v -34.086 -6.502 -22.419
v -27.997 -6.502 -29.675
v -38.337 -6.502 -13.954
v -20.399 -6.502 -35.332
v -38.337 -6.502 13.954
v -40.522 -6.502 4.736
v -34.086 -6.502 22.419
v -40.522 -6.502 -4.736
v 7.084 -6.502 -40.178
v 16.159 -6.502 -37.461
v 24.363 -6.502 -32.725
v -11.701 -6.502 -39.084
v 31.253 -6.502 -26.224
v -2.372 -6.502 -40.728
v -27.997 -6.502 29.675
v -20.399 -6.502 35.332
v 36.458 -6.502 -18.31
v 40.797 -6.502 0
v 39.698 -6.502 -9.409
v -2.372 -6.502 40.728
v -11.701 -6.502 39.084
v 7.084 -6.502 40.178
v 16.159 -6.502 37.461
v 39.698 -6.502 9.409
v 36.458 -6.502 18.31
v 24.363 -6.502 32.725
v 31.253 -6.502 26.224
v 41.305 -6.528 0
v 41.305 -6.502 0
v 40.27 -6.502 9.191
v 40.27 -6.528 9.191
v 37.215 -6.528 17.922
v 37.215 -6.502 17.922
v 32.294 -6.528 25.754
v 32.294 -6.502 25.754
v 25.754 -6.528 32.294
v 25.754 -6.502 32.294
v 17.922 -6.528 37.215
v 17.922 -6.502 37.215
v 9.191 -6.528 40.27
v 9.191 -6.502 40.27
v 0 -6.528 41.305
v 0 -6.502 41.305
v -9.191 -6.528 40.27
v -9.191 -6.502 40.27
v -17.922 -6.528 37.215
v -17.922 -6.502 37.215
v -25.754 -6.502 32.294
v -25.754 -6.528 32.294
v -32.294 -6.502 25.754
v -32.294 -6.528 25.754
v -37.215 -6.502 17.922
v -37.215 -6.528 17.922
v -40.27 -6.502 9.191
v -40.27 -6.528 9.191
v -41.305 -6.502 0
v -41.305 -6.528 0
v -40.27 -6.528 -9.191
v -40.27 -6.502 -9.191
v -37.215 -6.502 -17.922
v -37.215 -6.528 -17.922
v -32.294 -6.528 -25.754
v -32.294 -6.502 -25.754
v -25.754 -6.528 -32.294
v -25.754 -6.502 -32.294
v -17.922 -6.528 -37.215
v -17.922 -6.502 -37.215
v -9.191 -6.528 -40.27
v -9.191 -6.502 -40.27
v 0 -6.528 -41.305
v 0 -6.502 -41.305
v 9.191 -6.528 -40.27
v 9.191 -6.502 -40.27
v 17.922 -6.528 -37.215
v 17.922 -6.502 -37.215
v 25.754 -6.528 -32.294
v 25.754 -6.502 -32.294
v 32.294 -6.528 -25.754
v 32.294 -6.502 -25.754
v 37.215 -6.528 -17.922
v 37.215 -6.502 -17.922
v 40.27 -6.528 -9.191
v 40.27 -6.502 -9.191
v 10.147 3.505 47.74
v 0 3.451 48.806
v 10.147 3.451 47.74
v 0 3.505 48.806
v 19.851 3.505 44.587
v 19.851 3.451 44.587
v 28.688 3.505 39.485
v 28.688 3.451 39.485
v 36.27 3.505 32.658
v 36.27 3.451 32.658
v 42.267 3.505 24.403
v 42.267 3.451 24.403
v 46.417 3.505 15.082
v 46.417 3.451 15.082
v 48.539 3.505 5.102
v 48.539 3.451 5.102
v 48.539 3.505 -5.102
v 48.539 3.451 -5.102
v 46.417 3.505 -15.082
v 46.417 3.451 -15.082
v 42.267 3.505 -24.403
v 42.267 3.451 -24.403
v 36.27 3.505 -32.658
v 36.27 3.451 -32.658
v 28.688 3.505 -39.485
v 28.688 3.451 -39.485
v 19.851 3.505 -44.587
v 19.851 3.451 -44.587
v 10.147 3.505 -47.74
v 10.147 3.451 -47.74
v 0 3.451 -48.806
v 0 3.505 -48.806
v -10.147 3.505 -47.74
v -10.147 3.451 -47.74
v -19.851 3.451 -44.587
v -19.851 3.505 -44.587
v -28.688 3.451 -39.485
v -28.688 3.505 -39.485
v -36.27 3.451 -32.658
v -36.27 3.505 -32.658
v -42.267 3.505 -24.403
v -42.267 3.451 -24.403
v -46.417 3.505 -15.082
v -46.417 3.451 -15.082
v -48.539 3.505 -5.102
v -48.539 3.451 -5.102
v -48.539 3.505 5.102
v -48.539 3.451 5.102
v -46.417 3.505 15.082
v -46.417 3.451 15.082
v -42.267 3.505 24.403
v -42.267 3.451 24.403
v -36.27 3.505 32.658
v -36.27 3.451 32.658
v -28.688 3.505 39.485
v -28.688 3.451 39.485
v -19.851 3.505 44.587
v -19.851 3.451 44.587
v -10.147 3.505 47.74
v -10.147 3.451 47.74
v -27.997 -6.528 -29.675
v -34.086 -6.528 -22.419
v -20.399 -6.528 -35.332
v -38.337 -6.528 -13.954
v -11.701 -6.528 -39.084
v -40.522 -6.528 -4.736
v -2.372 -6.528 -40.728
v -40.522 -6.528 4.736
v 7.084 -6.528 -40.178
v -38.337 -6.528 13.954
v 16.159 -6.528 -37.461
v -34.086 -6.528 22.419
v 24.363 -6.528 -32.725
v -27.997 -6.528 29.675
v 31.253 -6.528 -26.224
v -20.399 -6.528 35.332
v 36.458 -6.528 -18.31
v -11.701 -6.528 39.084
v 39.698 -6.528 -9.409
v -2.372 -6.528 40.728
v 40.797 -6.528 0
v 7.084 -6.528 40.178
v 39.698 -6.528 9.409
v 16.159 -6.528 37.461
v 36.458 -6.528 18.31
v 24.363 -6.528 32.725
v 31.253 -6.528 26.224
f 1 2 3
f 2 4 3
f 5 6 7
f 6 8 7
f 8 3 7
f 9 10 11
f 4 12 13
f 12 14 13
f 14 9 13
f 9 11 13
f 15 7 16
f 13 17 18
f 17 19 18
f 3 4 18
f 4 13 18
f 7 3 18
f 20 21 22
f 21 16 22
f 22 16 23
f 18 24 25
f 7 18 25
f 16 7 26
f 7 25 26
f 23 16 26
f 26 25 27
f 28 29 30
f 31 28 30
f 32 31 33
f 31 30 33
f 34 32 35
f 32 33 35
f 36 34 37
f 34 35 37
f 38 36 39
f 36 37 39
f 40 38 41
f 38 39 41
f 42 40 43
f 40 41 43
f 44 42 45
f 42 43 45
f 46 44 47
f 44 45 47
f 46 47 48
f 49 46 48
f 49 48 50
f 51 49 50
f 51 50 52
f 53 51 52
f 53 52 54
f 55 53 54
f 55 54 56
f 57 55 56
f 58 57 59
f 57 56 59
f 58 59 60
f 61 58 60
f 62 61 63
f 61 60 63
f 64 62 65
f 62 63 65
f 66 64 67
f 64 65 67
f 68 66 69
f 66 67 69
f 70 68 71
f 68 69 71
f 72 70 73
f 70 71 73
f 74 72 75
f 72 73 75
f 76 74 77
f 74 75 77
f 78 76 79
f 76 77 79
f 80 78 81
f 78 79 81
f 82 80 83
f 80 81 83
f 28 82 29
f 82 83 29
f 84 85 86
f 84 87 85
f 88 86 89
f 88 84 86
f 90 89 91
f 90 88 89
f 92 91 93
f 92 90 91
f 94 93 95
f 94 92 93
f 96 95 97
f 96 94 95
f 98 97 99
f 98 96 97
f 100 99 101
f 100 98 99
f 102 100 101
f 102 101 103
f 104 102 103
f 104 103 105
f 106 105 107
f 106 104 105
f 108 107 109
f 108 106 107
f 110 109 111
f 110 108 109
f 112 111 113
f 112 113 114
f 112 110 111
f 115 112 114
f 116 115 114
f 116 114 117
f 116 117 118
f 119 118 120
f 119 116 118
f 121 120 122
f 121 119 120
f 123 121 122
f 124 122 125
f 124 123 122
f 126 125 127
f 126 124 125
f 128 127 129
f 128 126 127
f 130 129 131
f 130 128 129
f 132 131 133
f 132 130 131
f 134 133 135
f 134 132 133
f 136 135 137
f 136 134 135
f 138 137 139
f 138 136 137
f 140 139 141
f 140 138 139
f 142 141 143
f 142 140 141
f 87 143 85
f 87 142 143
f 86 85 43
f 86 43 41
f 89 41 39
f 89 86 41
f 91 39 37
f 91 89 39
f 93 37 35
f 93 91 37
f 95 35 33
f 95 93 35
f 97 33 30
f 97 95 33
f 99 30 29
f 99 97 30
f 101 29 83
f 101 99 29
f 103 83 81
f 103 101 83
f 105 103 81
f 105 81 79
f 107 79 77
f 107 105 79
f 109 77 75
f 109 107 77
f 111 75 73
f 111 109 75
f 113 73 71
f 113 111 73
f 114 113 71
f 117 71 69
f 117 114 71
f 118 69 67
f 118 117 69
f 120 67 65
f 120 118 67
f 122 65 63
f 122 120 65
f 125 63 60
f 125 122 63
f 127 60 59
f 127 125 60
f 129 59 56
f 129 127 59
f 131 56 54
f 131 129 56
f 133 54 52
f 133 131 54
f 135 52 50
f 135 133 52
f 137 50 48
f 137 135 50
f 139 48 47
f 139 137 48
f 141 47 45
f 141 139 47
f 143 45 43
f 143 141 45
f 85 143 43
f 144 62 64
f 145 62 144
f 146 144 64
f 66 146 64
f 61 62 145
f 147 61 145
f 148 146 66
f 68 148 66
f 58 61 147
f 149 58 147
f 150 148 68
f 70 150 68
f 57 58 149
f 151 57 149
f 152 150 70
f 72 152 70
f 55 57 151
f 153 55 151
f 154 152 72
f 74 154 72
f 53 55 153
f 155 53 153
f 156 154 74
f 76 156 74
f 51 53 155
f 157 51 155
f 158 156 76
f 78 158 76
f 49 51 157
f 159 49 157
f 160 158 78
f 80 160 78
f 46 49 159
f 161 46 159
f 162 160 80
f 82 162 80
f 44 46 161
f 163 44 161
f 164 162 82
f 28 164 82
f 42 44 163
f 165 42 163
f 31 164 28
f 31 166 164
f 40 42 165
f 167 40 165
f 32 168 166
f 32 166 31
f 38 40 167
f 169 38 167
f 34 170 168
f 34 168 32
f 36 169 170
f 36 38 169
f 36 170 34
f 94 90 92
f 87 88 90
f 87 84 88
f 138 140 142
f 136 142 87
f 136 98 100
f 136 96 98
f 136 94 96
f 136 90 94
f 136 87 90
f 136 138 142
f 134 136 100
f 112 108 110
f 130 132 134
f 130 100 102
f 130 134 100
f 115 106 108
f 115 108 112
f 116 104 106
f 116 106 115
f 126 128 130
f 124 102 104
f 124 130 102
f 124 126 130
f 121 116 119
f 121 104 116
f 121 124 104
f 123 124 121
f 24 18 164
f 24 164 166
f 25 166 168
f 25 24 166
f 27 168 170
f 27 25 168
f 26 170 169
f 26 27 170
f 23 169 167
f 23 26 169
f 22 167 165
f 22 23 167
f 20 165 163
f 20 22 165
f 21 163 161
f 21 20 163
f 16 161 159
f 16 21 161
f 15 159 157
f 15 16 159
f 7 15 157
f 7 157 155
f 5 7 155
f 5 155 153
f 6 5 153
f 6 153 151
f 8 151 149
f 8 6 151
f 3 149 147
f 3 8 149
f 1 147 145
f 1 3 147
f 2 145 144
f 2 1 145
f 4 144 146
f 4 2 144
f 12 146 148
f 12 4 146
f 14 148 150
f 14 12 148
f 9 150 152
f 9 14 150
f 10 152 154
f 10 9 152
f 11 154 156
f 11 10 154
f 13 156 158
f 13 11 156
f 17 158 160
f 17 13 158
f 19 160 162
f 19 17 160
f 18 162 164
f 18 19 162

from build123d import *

# Parameters (mm, degrees)
SKETCH1_R               = 48.8061
EXTRUDE1_DEPTH          = 6.5024
CHAMFER2_SIZE           = 7.50062
CHAMFER2_SIZE2          = 9.95365893
SKETCH6_R               = 41.30548
SKETCH6_R_2             = 40.79748
EXTRUDE_THIN2_DEPTH     = 0.0254
CUT_EXTRUDE1_DEPTH      = 70.330245689
CUT_EXTRUDE1_DEPTH_BACK = 70.330245689
SKETCH7_W               = 97.6122
SKETCH7_H               = 2.9972


with BuildPart() as part:
    # Sketch1 → Extrude1 (new, symmetric)
    with BuildSketch(Plane(origin=(0, 0, 0), x_dir=(1, 0, 0), z_dir=(0, 1, 0))):
        with Locations(Location((0, 0, 0), (0, 0, 270))):
            Circle(SKETCH1_R)
    extrude(amount=EXTRUDE1_DEPTH, both=True)

    # Chamfer2
    chamfer2_edges = [part.edges().sort_by_distance(p)[0] for p in [
        (0, -6.5024, -48.8061),
    ]]
    chamfer2_side = [part.faces().sort_by_distance(p)[0] for p in [
        (0, -6.5024, 0),
    ]]
    chamfer(chamfer2_edges, length=CHAMFER2_SIZE, length2=CHAMFER2_SIZE2, reference=chamfer2_side[0])

    # Sketch6 → Extrude-Thin2 (add)
    with BuildSketch(Plane.XZ.offset(6.5024)):
        Circle(SKETCH6_R)
        Circle(SKETCH6_R_2, mode=Mode.SUBTRACT)
    extrude(amount=EXTRUDE_THIN2_DEPTH)

    # Sketch7 → Cut-Extrude1 (cut, two sides: drawn at the far end of the back side and taken through both)
    with BuildSketch(Plane(origin=(0, 0, 0), x_dir=(0, 0, -1), z_dir=(1, 0, 0)).offset(-CUT_EXTRUDE1_DEPTH_BACK)):
        with Locations((0, 5.0038)):
            Rectangle(SKETCH7_W, SKETCH7_H)
    extrude(amount=CUT_EXTRUDE1_DEPTH + CUT_EXTRUDE1_DEPTH_BACK, mode=Mode.SUBTRACT)


solid = part.part
